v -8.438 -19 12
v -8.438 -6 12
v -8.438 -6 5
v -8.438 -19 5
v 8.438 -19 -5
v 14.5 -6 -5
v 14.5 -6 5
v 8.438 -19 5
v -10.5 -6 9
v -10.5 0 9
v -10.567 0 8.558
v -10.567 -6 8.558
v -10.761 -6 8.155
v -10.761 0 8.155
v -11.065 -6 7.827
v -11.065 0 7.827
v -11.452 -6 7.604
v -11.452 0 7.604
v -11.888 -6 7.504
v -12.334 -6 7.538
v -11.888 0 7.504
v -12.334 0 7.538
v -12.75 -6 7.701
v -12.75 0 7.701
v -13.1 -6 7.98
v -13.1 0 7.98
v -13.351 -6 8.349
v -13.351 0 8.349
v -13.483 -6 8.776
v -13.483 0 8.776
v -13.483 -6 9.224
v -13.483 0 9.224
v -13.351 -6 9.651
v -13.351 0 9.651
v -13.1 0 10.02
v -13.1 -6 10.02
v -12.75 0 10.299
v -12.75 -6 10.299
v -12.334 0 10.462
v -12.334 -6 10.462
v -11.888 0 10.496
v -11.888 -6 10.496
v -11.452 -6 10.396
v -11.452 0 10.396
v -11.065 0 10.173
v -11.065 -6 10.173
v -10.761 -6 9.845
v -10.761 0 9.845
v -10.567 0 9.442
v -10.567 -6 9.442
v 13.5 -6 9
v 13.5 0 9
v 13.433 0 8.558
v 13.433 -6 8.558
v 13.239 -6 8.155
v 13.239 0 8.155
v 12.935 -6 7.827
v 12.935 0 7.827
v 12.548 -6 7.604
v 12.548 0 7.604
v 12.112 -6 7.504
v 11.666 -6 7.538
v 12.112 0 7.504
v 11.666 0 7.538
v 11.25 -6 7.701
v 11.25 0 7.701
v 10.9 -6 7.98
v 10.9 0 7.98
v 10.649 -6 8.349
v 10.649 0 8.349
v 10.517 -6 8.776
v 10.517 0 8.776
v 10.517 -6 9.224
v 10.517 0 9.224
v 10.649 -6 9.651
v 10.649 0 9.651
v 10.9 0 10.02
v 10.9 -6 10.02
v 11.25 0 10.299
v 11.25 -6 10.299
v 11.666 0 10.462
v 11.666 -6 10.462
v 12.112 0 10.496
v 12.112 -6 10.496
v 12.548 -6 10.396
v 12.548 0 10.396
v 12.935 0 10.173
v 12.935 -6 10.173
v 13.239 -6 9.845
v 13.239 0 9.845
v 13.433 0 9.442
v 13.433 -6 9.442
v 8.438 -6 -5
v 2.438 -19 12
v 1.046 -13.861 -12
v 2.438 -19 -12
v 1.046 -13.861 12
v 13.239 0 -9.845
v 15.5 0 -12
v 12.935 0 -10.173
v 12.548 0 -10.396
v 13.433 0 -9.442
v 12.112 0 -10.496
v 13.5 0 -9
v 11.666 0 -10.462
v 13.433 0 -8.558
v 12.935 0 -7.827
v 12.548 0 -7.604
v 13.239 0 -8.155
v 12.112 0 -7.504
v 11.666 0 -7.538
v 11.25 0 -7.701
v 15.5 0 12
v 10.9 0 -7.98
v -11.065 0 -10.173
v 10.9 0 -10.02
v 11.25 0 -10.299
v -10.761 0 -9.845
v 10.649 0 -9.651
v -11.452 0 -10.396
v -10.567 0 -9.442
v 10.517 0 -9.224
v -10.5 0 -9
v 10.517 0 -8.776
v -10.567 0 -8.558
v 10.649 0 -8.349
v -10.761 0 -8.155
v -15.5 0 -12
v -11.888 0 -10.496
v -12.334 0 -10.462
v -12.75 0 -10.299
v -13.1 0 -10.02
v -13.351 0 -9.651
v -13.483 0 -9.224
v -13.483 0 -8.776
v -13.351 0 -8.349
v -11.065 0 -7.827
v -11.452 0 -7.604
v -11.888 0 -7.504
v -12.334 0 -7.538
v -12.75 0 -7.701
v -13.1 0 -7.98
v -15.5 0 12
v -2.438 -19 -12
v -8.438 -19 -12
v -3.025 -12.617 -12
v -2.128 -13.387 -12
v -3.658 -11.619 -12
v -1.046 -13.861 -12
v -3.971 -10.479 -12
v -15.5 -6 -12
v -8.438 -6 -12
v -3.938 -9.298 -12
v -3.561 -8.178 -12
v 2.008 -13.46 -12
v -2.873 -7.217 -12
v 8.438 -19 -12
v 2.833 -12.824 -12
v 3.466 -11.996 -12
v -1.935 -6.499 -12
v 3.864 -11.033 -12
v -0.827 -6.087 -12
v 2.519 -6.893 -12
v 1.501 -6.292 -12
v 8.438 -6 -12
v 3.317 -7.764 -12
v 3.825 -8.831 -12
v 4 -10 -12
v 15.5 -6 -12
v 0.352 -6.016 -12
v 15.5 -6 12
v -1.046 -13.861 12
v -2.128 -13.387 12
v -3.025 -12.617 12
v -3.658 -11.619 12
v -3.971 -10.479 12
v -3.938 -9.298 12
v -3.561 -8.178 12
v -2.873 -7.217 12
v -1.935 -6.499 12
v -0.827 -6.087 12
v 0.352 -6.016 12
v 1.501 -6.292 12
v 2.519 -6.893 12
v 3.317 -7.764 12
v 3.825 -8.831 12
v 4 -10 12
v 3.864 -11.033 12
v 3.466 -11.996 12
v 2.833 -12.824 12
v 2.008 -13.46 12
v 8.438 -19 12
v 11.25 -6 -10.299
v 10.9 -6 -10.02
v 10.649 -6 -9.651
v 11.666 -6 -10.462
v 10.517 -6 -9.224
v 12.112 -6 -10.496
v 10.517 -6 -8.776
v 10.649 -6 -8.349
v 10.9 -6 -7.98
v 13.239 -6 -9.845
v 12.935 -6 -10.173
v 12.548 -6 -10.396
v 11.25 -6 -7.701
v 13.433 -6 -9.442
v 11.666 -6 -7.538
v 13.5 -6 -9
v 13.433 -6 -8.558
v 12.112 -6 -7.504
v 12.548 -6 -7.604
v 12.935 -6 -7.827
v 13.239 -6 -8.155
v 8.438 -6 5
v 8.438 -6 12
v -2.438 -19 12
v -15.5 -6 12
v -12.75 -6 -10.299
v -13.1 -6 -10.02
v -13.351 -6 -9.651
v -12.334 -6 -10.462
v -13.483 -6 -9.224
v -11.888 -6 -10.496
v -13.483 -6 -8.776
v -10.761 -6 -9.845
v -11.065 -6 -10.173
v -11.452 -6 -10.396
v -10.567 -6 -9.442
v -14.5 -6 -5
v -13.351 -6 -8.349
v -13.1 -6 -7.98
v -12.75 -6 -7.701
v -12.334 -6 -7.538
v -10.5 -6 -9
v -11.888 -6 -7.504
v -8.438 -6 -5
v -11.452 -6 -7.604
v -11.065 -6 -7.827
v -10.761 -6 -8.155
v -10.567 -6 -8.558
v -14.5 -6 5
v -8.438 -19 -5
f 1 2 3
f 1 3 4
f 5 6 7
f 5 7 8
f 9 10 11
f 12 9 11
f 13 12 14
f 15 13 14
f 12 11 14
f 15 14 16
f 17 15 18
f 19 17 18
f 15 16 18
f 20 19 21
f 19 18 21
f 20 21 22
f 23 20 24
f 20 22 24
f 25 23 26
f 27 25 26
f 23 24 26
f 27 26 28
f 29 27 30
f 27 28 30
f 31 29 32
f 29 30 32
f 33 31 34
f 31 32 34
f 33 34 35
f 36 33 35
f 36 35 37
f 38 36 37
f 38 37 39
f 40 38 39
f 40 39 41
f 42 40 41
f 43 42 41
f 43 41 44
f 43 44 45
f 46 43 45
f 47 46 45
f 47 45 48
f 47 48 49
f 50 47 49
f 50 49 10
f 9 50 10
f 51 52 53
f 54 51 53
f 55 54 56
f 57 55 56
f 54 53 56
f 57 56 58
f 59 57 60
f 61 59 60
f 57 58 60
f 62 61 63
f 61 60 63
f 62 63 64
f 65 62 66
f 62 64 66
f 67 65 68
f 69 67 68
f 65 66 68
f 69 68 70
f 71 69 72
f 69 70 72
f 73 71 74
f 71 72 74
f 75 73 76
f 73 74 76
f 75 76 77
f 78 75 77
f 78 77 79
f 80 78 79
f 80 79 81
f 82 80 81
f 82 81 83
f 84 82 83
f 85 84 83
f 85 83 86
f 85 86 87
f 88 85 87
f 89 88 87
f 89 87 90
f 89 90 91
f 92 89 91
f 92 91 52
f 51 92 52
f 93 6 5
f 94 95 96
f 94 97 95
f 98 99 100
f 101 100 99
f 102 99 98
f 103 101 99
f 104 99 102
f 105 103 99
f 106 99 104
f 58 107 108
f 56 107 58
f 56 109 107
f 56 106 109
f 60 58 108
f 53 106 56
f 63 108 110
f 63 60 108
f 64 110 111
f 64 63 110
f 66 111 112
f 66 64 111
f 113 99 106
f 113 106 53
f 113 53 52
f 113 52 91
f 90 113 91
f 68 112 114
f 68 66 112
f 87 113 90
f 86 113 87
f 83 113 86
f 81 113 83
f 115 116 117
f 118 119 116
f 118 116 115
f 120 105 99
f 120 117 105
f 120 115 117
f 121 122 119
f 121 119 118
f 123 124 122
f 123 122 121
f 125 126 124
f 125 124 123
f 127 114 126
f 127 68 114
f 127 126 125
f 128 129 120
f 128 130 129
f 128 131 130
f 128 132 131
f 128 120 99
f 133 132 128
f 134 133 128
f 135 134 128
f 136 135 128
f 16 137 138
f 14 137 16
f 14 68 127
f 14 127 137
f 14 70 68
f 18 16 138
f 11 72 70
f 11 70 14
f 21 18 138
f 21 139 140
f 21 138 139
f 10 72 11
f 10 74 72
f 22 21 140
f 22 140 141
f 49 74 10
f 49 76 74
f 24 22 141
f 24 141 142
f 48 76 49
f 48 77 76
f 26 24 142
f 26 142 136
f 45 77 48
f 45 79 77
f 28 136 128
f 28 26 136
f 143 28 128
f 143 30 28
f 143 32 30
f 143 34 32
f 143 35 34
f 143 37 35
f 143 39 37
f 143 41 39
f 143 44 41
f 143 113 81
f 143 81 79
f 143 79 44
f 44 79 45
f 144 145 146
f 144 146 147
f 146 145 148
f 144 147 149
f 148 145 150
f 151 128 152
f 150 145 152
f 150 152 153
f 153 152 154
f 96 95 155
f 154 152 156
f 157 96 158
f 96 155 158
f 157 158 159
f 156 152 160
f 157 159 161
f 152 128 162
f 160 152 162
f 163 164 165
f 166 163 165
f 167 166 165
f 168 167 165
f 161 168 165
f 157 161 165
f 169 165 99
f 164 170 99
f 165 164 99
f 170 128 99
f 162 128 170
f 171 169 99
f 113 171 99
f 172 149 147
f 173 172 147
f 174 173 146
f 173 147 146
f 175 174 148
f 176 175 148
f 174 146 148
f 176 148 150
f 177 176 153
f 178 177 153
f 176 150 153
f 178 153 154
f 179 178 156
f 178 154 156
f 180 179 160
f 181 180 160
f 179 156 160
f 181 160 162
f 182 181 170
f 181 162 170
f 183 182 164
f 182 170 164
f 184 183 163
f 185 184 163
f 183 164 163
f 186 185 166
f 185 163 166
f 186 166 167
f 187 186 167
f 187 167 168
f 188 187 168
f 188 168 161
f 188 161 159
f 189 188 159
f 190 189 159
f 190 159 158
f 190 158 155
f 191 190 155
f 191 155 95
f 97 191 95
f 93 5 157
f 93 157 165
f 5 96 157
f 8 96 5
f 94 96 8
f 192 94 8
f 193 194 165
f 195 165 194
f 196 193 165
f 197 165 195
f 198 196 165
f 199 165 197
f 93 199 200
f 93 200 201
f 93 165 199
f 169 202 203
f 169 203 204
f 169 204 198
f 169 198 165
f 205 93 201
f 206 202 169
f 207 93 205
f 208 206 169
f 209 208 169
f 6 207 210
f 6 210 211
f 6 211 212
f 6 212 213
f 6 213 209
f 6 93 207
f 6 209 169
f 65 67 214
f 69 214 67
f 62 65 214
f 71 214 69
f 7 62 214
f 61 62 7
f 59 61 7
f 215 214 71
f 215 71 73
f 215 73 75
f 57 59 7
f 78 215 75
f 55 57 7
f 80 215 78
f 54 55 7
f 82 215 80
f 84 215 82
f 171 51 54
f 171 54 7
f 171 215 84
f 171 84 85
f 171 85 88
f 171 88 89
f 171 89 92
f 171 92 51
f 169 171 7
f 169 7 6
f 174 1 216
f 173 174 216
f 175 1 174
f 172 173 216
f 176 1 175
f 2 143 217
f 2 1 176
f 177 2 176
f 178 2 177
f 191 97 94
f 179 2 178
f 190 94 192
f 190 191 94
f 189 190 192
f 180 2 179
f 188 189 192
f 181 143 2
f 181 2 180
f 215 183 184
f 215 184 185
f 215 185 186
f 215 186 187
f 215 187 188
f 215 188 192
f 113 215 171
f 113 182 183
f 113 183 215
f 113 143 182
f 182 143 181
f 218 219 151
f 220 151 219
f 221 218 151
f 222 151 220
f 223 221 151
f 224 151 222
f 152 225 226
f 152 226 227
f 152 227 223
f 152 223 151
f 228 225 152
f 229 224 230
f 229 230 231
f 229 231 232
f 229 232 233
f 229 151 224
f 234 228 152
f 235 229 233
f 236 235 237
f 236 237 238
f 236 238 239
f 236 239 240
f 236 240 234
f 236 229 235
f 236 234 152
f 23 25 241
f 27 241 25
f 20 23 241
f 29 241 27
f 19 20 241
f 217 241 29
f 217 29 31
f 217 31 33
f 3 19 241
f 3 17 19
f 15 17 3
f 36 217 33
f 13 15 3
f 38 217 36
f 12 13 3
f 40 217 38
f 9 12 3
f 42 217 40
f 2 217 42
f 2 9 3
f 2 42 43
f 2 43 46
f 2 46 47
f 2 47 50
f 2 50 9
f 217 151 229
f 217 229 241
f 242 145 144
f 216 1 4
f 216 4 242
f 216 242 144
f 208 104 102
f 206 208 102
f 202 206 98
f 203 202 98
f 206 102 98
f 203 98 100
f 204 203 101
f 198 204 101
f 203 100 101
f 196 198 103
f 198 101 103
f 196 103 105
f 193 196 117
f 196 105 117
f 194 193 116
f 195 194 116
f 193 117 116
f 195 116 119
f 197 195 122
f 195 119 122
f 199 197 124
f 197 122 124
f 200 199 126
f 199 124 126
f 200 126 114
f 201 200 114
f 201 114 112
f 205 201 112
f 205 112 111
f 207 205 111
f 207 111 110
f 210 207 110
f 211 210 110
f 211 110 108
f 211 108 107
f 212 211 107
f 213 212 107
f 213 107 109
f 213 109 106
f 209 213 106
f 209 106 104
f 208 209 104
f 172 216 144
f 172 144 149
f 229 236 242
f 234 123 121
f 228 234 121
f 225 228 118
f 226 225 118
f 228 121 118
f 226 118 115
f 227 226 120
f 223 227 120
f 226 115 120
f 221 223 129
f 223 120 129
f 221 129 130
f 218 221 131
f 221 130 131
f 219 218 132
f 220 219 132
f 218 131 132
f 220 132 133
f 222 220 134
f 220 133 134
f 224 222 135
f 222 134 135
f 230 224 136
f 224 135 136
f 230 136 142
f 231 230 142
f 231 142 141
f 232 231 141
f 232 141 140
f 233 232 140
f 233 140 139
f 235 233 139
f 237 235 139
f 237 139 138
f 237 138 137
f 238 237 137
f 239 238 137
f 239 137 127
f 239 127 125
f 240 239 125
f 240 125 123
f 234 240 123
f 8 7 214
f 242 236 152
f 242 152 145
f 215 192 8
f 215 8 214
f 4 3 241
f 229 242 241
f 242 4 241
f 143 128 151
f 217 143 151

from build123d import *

# Parameters (mm, degrees)
SALIENTE_EXTRUIR2_DEPTH = 12
SALIENTE_EXTRUIR3_DEPTH = 5
CORTAR_EXTRUIR1_REACH   = 21
CROQUIS4_R              = 1.5


with BuildPart() as part:
    # Croquis2 → Saliente-Extruir2 (new body, symmetric)
    with BuildSketch(Plane.XY):
        with BuildLine():
            Line((8.438000444, -19), (8.438000444, -6))
            Line((8.438000444, -6), (14.5, -6))
            Line((14.5, -6), (15.5, -6))
            Line((15.5, -6), (15.5, 0))
            Line((15.5, 0), (-15.5, 0))
            Line((-15.5, 0), (-15.5, -6))
            Line((-15.5, -6), (-14.5, -6))
            Line((-14.5, -6), (-8.438000444, -6))
            Line((-8.438000444, -6), (-8.438000444, -19))
            Line((-8.438000444, -19), (-2.438000444, -19))
            Line((-2.438000444, -19), (-1.045861913, -13.860851313))
            ThreePointArc((-1.045861913, -13.860851313), (-2.430694587, -6.823252634), (4, -10))
            ThreePointArc((4, -10), (3.176747366, -12.430694587), (1.045861913, -13.860851313))
            Line((1.045861913, -13.860851313), (2.438000444, -19))
            Line((2.438000444, -19), (8.438000444, -19))
        make_face()
    extrude(amount=SALIENTE_EXTRUIR2_DEPTH, both=True)

    # Croquis3 → Saliente-Extruir3 (add, symmetric)
    with BuildSketch(Plane.XY):
        Polygon((8.438000444, -6), (14.5, -6), (8.438000444, -19), align=None)
        Polygon((-8.438000444, -6), (-8.438000444, -19), (-14.5, -6), align=None)
    extrude(amount=SALIENTE_EXTRUIR3_DEPTH, both=True)

    # Croquis4 → Cortar-Extruir1 (cut, up to next)
    with BuildSketch(Plane(origin=(0, 0, 0), x_dir=(1, 0, 0), z_dir=(0, 1, 0)), mode=Mode.PRIVATE) as cortar_extruir1_sk1:
        with Locations((-12, 9)):
            Circle(CROQUIS4_R)
    cortar_extruir1_tool1 = extrude(cortar_extruir1_sk1.sketch, amount=-CORTAR_EXTRUIR1_REACH, mode=Mode.PRIVATE) & part.part
    add(cortar_extruir1_tool1.solids().sort_by_distance((-12, 0, -9))[0], mode=Mode.SUBTRACT)
    # Croquis4 → Cortar-Extruir1 (cut, up to next)
    with BuildSketch(Plane(origin=(0, 0, 0), x_dir=(1, 0, 0), z_dir=(0, 1, 0)), mode=Mode.PRIVATE) as cortar_extruir1_sk2:
        with Locations((12, 9)):
            Circle(CROQUIS4_R)
    cortar_extruir1_tool2 = extrude(cortar_extruir1_sk2.sketch, amount=-CORTAR_EXTRUIR1_REACH, mode=Mode.PRIVATE) & part.part
    add(cortar_extruir1_tool2.solids().sort_by_distance((12, 0, -9))[0], mode=Mode.SUBTRACT)
    # Croquis4 → Cortar-Extruir1 (cut, up to next)
    with BuildSketch(Plane(origin=(0, 0, 0), x_dir=(1, 0, 0), z_dir=(0, 1, 0)), mode=Mode.PRIVATE) as cortar_extruir1_sk3:
        with Locations((12, -9)):
            Circle(CROQUIS4_R)
    cortar_extruir1_tool3 = extrude(cortar_extruir1_sk3.sketch, amount=-CORTAR_EXTRUIR1_REACH, mode=Mode.PRIVATE) & part.part
    add(cortar_extruir1_tool3.solids().sort_by_distance((12, 0, 9))[0], mode=Mode.SUBTRACT)
    # Croquis4 → Cortar-Extruir1 (cut, up to next)
    with BuildSketch(Plane(origin=(0, 0, 0), x_dir=(1, 0, 0), z_dir=(0, 1, 0)), mode=Mode.PRIVATE) as cortar_extruir1_sk4:
        with Locations((-12, -9)):
            Circle(CROQUIS4_R)
    cortar_extruir1_tool4 = extrude(cortar_extruir1_sk4.sketch, amount=-CORTAR_EXTRUIR1_REACH, mode=Mode.PRIVATE) & part.part
    add(cortar_extruir1_tool4.solids().sort_by_distance((-12, 0, 9))[0], mode=Mode.SUBTRACT)


solid = part.part
